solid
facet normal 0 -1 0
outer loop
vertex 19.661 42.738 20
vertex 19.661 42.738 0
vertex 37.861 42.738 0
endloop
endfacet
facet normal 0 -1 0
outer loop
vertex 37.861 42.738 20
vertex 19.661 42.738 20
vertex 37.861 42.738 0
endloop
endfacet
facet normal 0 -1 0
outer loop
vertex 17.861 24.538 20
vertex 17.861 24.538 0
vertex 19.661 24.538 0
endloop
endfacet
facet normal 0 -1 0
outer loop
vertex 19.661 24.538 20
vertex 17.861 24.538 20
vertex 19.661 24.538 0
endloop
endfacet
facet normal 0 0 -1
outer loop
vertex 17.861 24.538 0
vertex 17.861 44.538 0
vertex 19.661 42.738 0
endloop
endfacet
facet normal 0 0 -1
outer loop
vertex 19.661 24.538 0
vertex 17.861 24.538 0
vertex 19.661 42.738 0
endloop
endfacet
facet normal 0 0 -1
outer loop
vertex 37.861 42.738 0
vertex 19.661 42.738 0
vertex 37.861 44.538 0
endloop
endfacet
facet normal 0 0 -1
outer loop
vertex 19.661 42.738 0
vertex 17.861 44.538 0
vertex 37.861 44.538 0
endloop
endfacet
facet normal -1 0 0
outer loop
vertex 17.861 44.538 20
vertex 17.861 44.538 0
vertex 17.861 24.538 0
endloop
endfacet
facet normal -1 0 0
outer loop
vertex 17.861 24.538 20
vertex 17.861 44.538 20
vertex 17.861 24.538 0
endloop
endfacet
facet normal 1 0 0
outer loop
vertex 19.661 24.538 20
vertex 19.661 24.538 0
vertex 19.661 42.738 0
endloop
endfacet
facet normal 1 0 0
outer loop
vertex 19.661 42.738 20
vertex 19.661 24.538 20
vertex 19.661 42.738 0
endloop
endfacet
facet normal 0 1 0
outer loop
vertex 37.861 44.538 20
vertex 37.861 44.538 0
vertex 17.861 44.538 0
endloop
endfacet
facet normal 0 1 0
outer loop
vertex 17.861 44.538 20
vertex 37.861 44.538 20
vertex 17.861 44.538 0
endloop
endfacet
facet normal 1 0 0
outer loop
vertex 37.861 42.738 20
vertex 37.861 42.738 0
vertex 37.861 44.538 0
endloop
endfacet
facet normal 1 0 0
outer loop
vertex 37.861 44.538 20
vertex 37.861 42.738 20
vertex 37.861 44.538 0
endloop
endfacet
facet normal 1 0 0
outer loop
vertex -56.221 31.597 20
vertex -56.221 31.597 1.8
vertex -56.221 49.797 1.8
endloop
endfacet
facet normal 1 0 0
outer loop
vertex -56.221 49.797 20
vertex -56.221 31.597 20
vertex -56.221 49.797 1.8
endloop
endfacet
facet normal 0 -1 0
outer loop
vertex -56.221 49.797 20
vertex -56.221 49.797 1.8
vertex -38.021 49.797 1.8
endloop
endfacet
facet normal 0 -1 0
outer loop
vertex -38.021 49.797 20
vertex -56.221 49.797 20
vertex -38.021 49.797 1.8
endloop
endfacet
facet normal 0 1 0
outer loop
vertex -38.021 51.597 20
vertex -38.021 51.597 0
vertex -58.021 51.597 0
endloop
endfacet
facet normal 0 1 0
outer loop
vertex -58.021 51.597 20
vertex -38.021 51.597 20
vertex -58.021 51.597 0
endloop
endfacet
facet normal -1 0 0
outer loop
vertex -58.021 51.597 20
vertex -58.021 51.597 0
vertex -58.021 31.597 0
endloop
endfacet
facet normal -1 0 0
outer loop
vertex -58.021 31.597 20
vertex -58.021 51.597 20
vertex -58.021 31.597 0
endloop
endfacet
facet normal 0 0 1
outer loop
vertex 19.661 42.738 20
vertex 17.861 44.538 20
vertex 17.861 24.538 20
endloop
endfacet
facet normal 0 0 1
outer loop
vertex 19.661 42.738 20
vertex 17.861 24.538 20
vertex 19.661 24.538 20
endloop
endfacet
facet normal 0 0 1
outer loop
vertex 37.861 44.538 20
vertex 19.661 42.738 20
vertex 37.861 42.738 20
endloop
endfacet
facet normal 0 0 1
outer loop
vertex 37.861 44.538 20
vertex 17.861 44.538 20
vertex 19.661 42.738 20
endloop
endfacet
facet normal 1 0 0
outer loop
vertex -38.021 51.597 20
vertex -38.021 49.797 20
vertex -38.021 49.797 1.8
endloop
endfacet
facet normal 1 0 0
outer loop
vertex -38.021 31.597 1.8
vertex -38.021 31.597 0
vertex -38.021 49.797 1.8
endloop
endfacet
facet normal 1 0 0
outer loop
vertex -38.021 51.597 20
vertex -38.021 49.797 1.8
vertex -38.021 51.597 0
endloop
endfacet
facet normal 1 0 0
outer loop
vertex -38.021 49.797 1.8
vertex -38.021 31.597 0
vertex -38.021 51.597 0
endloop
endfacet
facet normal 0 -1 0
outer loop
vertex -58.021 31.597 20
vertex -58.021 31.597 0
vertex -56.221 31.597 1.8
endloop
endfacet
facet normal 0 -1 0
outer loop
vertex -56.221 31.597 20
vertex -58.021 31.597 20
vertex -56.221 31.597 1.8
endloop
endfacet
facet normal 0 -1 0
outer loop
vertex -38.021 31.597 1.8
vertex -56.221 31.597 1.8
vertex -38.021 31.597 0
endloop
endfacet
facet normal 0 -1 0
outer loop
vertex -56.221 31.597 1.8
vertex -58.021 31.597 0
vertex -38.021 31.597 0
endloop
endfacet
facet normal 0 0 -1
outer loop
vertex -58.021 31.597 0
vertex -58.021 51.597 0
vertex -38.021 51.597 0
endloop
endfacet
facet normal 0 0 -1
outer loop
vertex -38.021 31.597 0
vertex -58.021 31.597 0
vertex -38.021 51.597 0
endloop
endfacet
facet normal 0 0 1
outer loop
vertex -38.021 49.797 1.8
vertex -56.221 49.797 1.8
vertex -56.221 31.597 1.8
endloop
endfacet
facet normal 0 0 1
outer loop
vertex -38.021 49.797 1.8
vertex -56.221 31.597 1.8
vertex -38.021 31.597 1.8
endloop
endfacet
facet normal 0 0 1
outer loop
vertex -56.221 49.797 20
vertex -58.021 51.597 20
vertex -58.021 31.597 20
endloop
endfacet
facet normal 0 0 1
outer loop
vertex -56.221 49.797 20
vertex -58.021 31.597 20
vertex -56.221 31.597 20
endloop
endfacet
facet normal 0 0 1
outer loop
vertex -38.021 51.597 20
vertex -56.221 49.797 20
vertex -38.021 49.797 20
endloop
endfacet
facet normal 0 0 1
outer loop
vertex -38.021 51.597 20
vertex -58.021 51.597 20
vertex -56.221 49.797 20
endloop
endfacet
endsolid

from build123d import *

# Parameters (mm, degrees)
F0_W     = 18.2
F0_H     = 18.2
F1_DEPTH = 1.8
F2_DEPTH = 20
F3_DEPTH = 20


with BuildPart() as f1:
    # F0 (on Top) → F1 (new body)
    with BuildSketch(Plane.XY):
        with Locations((-47.121396, 40.697218)):
            Rectangle(F0_W, F0_H)
    extrude(amount=F1_DEPTH)

    # F0 (on Top) → F2 (join)
    with BuildSketch(Plane.XY):
        Polygon((-38.021396, 51.597218), (-58.021396, 51.597218), (-58.021396, 31.597218), (-56.221396, 31.597218), (-56.221396, 49.797218), (-38.021396, 49.797218), align=None)
    extrude(amount=F2_DEPTH)


with BuildPart() as f3:
    # F0 (on Top) → F3 (new body)
    with BuildSketch(Plane.XY):
        Polygon((19.660961, 44.538393), (17.860961, 44.538393), (17.860961, 24.538393), (19.660961, 24.538393), (19.660961, 42.738393), (37.860961, 42.738393), (37.860961, 44.538393), align=None)
    extrude(amount=F3_DEPTH)


solid = Compound([f1.part, f3.part])
